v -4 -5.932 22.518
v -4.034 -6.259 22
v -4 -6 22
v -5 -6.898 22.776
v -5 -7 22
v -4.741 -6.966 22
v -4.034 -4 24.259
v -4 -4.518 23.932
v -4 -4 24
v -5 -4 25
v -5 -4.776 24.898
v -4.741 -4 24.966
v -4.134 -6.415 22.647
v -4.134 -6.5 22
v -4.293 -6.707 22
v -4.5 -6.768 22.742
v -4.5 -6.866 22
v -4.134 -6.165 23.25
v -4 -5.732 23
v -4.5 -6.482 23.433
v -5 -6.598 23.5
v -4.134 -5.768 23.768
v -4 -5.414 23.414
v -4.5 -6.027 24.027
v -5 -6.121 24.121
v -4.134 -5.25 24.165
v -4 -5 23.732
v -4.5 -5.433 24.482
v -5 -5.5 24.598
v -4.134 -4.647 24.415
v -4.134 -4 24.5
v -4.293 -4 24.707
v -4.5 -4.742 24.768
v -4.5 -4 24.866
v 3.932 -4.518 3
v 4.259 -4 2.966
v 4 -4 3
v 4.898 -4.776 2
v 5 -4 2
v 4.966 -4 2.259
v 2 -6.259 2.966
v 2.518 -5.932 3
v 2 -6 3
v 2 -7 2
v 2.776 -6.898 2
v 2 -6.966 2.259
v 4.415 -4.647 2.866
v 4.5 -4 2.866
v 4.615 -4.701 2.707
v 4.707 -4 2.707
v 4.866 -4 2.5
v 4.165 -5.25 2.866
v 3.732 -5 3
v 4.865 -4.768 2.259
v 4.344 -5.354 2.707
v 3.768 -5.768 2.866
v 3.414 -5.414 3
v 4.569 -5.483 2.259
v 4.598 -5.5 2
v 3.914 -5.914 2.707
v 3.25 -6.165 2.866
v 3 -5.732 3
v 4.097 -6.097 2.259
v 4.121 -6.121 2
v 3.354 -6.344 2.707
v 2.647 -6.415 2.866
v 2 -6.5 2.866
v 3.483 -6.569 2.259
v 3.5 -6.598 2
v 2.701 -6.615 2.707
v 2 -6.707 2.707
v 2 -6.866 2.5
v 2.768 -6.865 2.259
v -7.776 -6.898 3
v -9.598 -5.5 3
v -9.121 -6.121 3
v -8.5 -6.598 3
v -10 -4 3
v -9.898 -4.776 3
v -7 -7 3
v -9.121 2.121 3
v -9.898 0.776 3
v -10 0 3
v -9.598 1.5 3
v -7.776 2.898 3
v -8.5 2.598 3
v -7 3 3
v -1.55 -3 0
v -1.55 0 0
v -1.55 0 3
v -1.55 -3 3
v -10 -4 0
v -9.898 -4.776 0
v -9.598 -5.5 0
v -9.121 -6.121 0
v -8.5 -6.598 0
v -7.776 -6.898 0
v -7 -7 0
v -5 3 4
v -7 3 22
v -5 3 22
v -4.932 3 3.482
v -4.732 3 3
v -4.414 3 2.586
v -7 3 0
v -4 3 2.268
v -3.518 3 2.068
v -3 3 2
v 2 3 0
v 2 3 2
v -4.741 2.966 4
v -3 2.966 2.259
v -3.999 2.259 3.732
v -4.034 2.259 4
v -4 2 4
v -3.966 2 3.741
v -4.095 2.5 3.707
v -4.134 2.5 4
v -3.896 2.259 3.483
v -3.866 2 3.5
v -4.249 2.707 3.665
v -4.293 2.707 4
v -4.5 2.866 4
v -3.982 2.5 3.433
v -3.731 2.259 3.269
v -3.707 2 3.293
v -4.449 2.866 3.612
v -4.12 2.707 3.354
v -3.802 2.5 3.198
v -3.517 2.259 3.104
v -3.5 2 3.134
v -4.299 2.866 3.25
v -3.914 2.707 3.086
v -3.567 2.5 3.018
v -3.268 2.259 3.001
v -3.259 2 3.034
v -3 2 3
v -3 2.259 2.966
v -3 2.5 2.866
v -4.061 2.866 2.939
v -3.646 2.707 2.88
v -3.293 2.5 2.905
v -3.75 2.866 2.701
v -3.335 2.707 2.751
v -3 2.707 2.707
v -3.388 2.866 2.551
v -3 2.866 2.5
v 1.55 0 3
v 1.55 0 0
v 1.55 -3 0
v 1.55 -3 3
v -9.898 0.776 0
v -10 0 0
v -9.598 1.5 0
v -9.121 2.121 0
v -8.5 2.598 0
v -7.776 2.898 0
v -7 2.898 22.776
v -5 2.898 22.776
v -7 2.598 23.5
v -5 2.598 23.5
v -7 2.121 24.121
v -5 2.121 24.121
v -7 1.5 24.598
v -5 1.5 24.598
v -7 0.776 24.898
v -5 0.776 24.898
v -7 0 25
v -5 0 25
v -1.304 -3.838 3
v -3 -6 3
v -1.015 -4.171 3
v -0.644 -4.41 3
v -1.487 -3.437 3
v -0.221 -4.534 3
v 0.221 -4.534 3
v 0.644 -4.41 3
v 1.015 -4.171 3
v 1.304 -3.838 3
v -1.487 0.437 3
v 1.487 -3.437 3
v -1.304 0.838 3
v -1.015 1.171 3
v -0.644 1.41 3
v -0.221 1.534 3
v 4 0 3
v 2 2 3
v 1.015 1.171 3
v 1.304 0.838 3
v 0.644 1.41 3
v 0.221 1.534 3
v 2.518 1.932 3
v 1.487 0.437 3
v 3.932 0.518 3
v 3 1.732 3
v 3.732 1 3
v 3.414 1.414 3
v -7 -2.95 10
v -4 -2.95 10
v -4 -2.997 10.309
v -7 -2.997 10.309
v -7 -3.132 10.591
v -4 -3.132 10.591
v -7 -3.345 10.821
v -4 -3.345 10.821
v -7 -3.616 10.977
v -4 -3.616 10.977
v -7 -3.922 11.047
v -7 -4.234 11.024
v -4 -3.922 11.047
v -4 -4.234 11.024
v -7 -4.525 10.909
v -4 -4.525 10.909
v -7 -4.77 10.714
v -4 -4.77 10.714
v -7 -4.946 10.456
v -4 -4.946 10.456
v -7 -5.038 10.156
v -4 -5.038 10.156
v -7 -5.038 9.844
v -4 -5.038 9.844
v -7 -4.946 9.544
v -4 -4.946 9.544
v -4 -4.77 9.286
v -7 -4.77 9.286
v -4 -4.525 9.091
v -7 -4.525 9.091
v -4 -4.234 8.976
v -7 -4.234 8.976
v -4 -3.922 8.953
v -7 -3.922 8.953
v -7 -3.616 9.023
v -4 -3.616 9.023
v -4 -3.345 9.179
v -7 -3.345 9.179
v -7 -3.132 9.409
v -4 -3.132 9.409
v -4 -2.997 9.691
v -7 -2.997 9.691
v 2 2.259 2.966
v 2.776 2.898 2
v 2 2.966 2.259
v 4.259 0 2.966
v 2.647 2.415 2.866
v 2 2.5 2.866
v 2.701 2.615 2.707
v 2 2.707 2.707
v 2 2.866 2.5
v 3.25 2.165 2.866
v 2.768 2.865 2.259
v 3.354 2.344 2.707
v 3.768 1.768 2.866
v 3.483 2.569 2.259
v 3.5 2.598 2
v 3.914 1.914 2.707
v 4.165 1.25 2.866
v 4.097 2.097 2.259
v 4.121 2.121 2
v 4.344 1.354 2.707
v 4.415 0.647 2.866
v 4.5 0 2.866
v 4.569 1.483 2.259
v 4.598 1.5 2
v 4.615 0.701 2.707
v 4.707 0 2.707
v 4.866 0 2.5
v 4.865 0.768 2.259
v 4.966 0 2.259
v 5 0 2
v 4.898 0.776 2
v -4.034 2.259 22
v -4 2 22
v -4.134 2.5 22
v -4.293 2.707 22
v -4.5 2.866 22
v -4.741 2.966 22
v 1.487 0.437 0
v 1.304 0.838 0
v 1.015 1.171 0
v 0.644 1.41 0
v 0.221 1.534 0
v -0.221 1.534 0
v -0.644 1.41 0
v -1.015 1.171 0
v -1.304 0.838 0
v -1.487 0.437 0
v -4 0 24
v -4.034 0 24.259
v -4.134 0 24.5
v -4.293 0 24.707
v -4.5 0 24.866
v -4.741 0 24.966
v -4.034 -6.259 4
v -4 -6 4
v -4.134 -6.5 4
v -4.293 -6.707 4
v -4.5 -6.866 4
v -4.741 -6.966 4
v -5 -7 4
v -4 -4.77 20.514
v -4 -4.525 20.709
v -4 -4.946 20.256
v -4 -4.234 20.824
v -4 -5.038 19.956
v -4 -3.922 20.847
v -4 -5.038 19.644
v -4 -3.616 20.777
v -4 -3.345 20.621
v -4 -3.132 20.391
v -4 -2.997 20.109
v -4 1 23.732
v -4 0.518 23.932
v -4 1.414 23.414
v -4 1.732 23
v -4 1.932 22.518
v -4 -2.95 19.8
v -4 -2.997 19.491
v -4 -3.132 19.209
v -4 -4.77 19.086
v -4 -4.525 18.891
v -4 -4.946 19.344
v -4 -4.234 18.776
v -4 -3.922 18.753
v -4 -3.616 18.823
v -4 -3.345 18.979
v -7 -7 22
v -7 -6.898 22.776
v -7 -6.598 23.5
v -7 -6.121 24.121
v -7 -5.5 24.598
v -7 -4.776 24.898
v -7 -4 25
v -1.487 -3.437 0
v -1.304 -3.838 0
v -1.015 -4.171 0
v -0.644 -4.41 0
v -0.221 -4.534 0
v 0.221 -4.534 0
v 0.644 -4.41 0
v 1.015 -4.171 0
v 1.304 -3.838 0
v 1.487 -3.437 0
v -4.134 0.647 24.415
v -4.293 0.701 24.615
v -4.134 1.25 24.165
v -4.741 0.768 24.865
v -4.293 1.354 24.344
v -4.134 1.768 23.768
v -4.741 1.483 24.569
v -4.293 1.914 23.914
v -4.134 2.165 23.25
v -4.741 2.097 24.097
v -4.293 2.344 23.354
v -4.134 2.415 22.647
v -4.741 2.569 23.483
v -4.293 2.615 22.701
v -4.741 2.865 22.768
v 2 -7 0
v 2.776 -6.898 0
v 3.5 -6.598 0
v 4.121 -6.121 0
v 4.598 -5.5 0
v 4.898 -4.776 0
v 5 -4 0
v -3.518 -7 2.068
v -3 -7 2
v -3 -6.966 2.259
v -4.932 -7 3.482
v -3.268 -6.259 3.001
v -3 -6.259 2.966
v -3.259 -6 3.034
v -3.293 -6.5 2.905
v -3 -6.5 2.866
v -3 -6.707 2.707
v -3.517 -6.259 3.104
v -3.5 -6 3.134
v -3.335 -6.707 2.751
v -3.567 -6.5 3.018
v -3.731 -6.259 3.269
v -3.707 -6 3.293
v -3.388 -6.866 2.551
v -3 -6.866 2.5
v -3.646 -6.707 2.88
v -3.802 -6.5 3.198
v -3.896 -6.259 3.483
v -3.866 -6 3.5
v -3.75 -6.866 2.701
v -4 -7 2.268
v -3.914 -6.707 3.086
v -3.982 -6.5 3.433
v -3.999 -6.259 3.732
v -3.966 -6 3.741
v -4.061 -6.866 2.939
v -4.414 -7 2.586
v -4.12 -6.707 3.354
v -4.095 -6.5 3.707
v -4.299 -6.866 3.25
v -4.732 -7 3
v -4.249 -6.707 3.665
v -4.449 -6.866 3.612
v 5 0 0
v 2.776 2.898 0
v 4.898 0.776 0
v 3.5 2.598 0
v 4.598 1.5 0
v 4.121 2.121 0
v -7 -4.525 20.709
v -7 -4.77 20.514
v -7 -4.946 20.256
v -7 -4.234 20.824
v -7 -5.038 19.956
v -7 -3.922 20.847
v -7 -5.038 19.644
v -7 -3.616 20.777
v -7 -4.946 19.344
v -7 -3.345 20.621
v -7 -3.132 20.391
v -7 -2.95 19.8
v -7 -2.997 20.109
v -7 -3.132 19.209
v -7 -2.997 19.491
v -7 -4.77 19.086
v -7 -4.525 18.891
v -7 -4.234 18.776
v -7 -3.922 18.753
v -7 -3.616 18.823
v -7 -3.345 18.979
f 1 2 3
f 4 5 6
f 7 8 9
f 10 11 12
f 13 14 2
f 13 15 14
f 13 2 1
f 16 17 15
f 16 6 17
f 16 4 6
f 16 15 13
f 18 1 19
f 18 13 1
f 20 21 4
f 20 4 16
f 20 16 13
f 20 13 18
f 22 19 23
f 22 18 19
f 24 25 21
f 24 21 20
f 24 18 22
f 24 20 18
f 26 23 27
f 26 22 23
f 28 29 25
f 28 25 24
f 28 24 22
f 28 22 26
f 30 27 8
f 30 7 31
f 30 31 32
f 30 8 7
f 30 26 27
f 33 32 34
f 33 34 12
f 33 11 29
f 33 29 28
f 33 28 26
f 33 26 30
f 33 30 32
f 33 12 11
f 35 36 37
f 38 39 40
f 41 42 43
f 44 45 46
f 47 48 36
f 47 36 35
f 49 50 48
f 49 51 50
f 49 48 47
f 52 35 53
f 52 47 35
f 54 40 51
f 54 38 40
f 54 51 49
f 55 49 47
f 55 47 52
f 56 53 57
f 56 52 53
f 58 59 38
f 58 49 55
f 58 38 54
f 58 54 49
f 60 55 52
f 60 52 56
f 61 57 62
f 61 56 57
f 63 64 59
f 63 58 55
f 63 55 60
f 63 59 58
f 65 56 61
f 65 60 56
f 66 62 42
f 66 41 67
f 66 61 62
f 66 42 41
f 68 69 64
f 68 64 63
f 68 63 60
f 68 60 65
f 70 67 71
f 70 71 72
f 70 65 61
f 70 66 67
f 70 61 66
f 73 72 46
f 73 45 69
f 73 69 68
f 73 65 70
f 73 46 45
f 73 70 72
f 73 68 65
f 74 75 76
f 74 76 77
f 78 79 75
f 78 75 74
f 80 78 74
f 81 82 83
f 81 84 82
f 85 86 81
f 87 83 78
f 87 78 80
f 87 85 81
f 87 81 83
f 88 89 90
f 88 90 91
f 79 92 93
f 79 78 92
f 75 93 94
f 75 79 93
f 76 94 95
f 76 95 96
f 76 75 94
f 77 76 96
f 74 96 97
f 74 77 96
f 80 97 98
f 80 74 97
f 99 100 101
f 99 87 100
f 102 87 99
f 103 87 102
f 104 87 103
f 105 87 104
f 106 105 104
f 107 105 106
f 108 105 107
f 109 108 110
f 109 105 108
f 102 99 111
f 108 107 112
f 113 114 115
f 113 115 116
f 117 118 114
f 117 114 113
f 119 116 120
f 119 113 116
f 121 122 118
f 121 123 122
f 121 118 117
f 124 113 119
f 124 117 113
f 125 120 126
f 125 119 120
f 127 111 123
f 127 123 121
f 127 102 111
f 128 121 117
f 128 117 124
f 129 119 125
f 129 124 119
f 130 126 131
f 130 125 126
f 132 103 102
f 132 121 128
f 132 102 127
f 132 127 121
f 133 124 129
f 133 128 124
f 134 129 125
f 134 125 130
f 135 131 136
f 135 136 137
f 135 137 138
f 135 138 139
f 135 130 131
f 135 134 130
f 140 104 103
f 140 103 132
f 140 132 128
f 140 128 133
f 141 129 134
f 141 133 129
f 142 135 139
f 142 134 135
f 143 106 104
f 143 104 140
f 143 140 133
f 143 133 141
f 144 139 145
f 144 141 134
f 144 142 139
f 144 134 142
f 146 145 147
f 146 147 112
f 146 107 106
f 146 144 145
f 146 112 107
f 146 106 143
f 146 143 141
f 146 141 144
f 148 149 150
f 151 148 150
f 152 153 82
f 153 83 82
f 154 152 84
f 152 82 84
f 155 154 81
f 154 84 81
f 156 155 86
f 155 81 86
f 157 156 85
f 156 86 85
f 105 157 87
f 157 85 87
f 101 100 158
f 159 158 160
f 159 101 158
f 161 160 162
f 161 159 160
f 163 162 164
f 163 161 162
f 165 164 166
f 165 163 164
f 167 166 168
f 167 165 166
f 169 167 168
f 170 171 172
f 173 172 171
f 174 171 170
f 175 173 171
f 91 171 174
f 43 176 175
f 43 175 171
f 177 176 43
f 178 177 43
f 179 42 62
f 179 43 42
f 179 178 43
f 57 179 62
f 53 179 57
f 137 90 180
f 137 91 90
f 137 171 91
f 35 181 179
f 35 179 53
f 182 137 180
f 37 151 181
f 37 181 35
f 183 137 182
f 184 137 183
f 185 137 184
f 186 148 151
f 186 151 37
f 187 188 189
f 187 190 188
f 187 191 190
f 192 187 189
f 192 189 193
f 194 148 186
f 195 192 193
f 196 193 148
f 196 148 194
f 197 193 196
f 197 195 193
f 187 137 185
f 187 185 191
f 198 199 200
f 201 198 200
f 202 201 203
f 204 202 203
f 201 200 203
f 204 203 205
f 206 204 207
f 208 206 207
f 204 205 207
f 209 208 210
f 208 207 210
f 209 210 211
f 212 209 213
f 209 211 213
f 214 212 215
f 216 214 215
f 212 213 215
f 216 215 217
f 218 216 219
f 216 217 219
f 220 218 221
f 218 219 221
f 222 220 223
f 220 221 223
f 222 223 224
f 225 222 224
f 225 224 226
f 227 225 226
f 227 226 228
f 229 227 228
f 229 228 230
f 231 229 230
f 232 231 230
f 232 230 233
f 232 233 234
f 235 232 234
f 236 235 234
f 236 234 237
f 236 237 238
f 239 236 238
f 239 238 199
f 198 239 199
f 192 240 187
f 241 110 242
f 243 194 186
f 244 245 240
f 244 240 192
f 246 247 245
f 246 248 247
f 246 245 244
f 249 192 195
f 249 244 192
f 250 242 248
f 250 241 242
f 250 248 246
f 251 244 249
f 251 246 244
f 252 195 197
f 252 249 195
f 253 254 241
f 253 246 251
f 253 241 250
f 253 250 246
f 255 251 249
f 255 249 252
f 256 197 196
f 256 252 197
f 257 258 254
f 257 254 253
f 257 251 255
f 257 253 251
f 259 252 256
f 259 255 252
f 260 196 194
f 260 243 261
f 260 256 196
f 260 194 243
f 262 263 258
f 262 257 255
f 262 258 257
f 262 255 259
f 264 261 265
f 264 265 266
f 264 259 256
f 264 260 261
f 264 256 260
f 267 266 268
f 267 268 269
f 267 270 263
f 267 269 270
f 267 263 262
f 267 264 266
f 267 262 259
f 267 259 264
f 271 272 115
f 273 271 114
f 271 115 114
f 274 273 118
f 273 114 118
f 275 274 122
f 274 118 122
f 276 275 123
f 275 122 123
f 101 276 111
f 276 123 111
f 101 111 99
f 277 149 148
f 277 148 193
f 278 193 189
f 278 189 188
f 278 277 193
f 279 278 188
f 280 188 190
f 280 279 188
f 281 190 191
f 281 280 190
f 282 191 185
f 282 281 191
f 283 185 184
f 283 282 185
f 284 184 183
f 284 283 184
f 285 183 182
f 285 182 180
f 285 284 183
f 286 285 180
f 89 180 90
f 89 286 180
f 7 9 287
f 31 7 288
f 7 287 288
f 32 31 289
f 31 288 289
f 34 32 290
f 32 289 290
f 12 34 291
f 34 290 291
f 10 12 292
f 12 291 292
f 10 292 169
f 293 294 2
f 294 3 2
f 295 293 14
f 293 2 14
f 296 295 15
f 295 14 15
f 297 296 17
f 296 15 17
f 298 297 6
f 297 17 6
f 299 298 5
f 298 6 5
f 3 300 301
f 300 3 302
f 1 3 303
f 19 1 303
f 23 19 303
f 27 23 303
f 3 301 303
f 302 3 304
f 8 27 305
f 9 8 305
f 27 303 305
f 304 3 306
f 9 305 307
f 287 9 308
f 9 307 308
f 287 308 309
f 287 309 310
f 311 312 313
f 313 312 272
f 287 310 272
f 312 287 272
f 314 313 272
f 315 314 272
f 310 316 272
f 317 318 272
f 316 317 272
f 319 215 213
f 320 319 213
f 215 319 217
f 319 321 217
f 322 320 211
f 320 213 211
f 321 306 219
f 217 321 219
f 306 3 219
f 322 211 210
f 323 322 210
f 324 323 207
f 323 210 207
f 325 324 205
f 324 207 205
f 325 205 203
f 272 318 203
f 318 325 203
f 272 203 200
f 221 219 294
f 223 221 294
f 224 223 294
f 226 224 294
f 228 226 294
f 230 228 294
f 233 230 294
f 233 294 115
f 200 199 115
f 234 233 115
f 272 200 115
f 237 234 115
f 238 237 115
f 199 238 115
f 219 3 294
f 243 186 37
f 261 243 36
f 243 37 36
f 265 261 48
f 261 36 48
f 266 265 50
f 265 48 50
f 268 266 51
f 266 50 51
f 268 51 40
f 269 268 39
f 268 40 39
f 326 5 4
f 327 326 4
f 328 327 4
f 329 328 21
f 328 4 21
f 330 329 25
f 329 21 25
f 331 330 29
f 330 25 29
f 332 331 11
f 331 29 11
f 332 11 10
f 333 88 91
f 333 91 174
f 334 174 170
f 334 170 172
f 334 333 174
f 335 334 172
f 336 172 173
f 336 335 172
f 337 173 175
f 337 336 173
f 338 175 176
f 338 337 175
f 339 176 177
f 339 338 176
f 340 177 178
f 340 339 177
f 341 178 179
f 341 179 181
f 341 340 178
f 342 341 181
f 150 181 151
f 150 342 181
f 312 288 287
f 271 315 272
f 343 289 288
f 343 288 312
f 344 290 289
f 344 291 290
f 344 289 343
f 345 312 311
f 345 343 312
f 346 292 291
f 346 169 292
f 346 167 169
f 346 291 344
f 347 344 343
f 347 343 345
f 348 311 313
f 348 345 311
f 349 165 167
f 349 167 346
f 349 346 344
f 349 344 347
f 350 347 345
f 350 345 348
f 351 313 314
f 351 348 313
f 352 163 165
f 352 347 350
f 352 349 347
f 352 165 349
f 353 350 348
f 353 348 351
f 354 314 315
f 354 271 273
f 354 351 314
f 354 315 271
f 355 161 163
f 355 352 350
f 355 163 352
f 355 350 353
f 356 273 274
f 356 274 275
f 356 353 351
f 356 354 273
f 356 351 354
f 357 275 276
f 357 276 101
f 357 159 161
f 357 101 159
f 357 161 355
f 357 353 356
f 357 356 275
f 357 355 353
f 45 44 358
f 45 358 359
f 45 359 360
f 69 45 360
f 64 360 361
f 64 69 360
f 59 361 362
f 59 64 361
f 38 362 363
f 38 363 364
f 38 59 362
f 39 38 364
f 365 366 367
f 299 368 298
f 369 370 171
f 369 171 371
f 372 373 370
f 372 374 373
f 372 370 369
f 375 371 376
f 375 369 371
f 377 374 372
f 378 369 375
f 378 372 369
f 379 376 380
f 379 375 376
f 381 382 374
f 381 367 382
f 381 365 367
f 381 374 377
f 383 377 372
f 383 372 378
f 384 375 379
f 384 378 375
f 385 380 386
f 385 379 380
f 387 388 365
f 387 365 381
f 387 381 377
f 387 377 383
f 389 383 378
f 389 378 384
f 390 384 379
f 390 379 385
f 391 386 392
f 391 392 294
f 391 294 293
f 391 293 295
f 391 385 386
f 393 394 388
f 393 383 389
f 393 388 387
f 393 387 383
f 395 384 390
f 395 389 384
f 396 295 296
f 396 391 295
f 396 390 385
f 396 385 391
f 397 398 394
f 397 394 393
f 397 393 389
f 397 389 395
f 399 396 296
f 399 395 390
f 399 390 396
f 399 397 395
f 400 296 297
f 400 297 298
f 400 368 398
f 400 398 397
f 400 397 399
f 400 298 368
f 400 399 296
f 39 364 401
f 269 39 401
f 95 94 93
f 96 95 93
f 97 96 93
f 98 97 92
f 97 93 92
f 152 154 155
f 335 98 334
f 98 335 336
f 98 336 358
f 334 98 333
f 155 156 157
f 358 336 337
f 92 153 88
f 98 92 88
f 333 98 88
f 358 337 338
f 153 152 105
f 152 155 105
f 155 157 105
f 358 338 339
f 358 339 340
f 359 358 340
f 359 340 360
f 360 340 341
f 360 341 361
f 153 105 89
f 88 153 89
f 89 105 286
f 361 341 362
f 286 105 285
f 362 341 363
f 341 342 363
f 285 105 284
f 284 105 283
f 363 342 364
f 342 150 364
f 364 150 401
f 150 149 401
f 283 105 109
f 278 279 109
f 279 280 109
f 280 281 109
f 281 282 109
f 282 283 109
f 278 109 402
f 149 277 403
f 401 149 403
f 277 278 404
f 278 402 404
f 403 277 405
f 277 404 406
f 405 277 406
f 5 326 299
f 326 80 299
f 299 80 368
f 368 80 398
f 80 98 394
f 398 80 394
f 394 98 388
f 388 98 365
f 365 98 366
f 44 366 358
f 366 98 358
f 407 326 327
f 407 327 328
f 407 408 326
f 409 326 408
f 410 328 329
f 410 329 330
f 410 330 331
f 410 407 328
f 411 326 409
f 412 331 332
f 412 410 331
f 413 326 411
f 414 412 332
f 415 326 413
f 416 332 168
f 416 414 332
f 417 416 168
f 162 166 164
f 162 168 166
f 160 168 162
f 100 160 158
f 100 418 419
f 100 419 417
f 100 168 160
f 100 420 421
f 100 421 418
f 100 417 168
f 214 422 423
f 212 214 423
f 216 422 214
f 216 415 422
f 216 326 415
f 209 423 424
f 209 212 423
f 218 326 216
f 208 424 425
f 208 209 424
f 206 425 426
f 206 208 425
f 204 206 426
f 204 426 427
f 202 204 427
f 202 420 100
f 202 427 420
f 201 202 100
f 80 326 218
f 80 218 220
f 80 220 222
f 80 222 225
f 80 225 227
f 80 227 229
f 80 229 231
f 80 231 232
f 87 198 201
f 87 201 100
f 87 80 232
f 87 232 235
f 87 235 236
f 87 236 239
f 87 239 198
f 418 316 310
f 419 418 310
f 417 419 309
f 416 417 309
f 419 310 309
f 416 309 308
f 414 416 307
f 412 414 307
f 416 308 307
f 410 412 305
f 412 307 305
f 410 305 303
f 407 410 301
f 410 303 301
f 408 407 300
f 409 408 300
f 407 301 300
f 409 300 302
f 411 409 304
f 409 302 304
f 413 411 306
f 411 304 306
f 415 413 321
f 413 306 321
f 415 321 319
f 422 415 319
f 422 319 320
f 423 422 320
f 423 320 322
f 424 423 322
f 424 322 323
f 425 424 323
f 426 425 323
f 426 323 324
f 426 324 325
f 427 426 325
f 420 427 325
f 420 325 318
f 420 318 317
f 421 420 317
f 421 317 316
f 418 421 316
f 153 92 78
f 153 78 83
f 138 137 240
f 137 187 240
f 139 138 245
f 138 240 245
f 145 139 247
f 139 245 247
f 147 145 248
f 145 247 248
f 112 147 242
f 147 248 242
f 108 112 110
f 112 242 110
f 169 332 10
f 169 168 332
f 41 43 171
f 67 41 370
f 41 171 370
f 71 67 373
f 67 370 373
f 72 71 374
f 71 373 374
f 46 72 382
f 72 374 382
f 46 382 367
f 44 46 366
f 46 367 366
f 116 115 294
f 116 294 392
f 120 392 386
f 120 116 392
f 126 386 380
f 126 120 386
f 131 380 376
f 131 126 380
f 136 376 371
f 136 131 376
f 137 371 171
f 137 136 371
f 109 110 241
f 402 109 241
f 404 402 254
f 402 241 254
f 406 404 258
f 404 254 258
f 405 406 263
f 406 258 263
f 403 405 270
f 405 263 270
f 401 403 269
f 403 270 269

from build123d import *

# Parameters (mm, degrees)
SKETCH_W     = 15
SKETCH_H     = 10
PAD_DEPTH    = 3
SKETCH001_W  = 3
SKETCH001_H  = 10
PAD001_DEPTH = 22
SKETCH002_R  = 1.05
POCKET_DEPTH = 6.001
FILLET_R     = 3
FILLET001_R  = 3
FILLET002_R  = 1
FILLET003_R  = 1


with BuildPart() as part:
    # Sketch → Pad (new body)
    with BuildSketch(Plane.XY):
        with Locations((-2.5, -2)):
            Rectangle(SKETCH_W, SKETCH_H)
        with BuildLine():
            ThreePointArc((1.55, 0), (0, 1.55), (-1.55, 0))
            Line((-1.55, 0), (-1.55, -3))
            ThreePointArc((-1.55, -3), (0, -4.55), (1.55, -3))
            Line((1.55, 0), (1.55, -3))
        make_face(mode=Mode.SUBTRACT)
    extrude(amount=PAD_DEPTH)

    # Sketch001 → Pad001 (new body)
    with BuildSketch(Plane.XY.offset(3)):
        with Locations((-5.5, -2)):
            Rectangle(SKETCH001_W, SKETCH001_H)
    extrude(amount=PAD001_DEPTH)

    # Sketch002 → Pocket (cut, through all)
    with BuildSketch(Plane.YZ.offset(-4)):
        with Locations((-4, 19.8)):
            Circle(SKETCH002_R)
        with Locations((-4, 10)):
            Circle(SKETCH002_R)
    extrude(amount=-POCKET_DEPTH, mode=Mode.SUBTRACT)

    # Fillet
    fillet_edges = [part.edges().sort_by_distance(p)[0] for p in [
        (-10, -7, 1.5),
        (-10, 3, 1.5),
        (5, -7, 1.5),
        (5, 3, 1.5),
    ]]
    fillet(fillet_edges, radius=FILLET_R)

    # Fillet001
    fillet001_edges = [part.edges().sort_by_distance(p)[0] for p in [
        (-5.5, -7, 25),
        (-5.5, 3, 25),
    ]]
    fillet(fillet001_edges, radius=FILLET001_R)

    # Fillet002
    fillet002_edges = [part.edges().sort_by_distance(p)[0] for p in [
        (-4, -2, 3),
    ]]
    fillet(fillet002_edges, radius=FILLET002_R)

    # Fillet003
    fillet003_edges = [part.edges().sort_by_distance(p)[0] for p in [
        (-4, -6.12132, 24.12132),
    ]]
    fillet(fillet003_edges, radius=FILLET003_R)


solid = part.part
